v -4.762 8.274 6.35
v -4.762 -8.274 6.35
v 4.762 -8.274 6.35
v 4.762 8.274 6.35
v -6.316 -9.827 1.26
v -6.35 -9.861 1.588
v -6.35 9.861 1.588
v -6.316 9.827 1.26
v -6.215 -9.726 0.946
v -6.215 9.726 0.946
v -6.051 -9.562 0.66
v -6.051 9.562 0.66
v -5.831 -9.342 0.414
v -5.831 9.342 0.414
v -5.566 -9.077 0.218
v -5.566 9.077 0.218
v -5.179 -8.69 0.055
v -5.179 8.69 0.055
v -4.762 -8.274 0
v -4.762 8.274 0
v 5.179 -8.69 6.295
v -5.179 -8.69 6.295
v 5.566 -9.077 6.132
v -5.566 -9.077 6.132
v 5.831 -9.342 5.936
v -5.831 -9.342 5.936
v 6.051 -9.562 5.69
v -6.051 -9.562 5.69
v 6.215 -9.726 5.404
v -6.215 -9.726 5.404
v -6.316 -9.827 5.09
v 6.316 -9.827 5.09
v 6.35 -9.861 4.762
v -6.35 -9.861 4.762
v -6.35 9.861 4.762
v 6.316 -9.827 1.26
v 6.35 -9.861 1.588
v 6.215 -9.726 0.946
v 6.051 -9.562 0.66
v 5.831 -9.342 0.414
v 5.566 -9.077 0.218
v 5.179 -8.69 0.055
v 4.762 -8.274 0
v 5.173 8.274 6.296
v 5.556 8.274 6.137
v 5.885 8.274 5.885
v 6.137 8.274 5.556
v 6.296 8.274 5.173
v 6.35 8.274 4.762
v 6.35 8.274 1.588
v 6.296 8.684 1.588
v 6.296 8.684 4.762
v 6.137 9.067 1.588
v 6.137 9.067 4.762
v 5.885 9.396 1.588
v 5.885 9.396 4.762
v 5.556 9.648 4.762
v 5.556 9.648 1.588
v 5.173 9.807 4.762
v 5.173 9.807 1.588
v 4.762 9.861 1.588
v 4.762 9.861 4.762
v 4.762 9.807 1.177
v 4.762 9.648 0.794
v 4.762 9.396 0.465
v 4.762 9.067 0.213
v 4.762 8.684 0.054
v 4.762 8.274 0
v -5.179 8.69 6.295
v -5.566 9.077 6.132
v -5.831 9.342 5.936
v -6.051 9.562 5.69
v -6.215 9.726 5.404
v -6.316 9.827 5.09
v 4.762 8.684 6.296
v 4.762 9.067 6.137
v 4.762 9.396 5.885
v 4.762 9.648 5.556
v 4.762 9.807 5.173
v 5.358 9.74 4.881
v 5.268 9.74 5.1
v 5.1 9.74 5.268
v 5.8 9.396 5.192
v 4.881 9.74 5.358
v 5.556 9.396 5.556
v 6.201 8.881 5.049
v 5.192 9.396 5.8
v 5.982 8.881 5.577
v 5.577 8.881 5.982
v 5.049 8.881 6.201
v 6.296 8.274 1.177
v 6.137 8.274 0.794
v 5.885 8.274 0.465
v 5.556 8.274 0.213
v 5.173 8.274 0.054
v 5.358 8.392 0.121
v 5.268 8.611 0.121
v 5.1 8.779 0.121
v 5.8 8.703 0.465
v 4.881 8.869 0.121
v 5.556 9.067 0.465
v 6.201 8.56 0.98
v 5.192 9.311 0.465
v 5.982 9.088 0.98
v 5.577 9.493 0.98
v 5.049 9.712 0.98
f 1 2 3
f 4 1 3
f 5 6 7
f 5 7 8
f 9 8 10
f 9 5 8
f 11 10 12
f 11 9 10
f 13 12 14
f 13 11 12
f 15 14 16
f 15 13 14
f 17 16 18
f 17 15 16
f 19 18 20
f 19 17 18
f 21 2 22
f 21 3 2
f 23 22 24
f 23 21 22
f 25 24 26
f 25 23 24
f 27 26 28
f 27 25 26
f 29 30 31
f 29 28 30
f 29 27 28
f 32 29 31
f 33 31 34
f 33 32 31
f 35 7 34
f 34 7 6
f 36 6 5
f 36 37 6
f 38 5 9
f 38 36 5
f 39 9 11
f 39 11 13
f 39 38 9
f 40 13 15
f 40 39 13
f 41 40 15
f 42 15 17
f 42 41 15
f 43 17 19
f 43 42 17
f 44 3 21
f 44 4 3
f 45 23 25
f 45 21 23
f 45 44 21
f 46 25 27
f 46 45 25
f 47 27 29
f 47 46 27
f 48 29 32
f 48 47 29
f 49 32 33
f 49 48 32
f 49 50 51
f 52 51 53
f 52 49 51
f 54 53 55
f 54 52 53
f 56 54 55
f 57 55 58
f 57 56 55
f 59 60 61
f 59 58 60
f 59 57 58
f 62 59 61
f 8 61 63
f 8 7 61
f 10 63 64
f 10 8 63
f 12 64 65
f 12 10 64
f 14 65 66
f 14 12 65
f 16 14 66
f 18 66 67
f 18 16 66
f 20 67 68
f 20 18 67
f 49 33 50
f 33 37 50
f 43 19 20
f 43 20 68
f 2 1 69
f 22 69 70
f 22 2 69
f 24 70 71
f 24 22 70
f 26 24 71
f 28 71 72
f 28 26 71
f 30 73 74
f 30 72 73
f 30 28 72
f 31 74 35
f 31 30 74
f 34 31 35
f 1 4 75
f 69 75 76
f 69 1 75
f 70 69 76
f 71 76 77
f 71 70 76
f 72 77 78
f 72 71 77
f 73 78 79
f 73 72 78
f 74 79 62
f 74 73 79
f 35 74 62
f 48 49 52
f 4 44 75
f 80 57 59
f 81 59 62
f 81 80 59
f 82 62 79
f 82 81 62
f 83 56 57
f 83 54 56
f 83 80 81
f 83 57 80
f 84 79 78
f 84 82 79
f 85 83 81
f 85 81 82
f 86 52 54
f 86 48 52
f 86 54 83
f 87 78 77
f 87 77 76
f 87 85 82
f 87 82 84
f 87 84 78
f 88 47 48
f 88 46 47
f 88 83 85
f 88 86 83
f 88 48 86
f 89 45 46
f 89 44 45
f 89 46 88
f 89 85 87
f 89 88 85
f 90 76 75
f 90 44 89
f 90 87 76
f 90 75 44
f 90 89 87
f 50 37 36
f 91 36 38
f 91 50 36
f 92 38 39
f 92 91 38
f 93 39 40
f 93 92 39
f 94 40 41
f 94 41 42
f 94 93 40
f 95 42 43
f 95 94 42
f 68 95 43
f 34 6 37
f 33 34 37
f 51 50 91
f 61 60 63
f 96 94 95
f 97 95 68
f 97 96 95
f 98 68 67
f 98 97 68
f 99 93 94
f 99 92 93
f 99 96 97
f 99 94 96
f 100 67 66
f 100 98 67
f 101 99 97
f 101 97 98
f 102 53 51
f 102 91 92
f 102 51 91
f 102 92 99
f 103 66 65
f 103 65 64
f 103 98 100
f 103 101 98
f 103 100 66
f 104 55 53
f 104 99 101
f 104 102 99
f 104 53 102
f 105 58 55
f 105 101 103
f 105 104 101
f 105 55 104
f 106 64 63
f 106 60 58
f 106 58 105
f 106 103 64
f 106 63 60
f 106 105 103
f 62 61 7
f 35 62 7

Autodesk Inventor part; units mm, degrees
ref_plane "YZ Plane" through (0, 0, 0) normal (1, 0, 0) x (0, 1, 0)
ref_plane "XZ Plane" through (0, 0, 0) normal (0, 1, 0) x (-1, 0, 0)
ref_plane "XY Plane" through (0, 0, 0) normal (0, 0, 1) x (1, 0, 0)
sketch "Sketch1" plane through (0, 0, 0) normal (0, 0, 1) x (1, 0, 0)
  line L0 (-6.35, -9.861) -> (6.35, -9.861)
  line L1 (6.35, -9.861) -> (6.35, 9.861)
  line L2 (6.35, 9.861) -> (-6.35, 9.861)
  line L3 (-6.35, 9.861) -> (-6.35, -9.861)
  line L4 (-6.35, -9.861) -> (6.35, 9.861) construction
  line L5 (6.35, -9.861) -> (-6.35, 9.861) construction
  point P0 (0, 0)
  dimension "d0" = 12.7
extrude "Extrusion1" add sketch "Sketch1" along normal blind 6.35
fillet "Fillet1" radius 1.5875 9 edges at (6.35, 0, 6.35) (6.35, 9.861, 3.175) (0, 9.861, 6.35) (0, 9.861, 0) (6.35, 0, 0) (0, -9.861, 6.35) (0, -9.861, 0) (-6.35, 0, 0) (-6.35, 0, 6.35)
properties part number "Motor Controller"
